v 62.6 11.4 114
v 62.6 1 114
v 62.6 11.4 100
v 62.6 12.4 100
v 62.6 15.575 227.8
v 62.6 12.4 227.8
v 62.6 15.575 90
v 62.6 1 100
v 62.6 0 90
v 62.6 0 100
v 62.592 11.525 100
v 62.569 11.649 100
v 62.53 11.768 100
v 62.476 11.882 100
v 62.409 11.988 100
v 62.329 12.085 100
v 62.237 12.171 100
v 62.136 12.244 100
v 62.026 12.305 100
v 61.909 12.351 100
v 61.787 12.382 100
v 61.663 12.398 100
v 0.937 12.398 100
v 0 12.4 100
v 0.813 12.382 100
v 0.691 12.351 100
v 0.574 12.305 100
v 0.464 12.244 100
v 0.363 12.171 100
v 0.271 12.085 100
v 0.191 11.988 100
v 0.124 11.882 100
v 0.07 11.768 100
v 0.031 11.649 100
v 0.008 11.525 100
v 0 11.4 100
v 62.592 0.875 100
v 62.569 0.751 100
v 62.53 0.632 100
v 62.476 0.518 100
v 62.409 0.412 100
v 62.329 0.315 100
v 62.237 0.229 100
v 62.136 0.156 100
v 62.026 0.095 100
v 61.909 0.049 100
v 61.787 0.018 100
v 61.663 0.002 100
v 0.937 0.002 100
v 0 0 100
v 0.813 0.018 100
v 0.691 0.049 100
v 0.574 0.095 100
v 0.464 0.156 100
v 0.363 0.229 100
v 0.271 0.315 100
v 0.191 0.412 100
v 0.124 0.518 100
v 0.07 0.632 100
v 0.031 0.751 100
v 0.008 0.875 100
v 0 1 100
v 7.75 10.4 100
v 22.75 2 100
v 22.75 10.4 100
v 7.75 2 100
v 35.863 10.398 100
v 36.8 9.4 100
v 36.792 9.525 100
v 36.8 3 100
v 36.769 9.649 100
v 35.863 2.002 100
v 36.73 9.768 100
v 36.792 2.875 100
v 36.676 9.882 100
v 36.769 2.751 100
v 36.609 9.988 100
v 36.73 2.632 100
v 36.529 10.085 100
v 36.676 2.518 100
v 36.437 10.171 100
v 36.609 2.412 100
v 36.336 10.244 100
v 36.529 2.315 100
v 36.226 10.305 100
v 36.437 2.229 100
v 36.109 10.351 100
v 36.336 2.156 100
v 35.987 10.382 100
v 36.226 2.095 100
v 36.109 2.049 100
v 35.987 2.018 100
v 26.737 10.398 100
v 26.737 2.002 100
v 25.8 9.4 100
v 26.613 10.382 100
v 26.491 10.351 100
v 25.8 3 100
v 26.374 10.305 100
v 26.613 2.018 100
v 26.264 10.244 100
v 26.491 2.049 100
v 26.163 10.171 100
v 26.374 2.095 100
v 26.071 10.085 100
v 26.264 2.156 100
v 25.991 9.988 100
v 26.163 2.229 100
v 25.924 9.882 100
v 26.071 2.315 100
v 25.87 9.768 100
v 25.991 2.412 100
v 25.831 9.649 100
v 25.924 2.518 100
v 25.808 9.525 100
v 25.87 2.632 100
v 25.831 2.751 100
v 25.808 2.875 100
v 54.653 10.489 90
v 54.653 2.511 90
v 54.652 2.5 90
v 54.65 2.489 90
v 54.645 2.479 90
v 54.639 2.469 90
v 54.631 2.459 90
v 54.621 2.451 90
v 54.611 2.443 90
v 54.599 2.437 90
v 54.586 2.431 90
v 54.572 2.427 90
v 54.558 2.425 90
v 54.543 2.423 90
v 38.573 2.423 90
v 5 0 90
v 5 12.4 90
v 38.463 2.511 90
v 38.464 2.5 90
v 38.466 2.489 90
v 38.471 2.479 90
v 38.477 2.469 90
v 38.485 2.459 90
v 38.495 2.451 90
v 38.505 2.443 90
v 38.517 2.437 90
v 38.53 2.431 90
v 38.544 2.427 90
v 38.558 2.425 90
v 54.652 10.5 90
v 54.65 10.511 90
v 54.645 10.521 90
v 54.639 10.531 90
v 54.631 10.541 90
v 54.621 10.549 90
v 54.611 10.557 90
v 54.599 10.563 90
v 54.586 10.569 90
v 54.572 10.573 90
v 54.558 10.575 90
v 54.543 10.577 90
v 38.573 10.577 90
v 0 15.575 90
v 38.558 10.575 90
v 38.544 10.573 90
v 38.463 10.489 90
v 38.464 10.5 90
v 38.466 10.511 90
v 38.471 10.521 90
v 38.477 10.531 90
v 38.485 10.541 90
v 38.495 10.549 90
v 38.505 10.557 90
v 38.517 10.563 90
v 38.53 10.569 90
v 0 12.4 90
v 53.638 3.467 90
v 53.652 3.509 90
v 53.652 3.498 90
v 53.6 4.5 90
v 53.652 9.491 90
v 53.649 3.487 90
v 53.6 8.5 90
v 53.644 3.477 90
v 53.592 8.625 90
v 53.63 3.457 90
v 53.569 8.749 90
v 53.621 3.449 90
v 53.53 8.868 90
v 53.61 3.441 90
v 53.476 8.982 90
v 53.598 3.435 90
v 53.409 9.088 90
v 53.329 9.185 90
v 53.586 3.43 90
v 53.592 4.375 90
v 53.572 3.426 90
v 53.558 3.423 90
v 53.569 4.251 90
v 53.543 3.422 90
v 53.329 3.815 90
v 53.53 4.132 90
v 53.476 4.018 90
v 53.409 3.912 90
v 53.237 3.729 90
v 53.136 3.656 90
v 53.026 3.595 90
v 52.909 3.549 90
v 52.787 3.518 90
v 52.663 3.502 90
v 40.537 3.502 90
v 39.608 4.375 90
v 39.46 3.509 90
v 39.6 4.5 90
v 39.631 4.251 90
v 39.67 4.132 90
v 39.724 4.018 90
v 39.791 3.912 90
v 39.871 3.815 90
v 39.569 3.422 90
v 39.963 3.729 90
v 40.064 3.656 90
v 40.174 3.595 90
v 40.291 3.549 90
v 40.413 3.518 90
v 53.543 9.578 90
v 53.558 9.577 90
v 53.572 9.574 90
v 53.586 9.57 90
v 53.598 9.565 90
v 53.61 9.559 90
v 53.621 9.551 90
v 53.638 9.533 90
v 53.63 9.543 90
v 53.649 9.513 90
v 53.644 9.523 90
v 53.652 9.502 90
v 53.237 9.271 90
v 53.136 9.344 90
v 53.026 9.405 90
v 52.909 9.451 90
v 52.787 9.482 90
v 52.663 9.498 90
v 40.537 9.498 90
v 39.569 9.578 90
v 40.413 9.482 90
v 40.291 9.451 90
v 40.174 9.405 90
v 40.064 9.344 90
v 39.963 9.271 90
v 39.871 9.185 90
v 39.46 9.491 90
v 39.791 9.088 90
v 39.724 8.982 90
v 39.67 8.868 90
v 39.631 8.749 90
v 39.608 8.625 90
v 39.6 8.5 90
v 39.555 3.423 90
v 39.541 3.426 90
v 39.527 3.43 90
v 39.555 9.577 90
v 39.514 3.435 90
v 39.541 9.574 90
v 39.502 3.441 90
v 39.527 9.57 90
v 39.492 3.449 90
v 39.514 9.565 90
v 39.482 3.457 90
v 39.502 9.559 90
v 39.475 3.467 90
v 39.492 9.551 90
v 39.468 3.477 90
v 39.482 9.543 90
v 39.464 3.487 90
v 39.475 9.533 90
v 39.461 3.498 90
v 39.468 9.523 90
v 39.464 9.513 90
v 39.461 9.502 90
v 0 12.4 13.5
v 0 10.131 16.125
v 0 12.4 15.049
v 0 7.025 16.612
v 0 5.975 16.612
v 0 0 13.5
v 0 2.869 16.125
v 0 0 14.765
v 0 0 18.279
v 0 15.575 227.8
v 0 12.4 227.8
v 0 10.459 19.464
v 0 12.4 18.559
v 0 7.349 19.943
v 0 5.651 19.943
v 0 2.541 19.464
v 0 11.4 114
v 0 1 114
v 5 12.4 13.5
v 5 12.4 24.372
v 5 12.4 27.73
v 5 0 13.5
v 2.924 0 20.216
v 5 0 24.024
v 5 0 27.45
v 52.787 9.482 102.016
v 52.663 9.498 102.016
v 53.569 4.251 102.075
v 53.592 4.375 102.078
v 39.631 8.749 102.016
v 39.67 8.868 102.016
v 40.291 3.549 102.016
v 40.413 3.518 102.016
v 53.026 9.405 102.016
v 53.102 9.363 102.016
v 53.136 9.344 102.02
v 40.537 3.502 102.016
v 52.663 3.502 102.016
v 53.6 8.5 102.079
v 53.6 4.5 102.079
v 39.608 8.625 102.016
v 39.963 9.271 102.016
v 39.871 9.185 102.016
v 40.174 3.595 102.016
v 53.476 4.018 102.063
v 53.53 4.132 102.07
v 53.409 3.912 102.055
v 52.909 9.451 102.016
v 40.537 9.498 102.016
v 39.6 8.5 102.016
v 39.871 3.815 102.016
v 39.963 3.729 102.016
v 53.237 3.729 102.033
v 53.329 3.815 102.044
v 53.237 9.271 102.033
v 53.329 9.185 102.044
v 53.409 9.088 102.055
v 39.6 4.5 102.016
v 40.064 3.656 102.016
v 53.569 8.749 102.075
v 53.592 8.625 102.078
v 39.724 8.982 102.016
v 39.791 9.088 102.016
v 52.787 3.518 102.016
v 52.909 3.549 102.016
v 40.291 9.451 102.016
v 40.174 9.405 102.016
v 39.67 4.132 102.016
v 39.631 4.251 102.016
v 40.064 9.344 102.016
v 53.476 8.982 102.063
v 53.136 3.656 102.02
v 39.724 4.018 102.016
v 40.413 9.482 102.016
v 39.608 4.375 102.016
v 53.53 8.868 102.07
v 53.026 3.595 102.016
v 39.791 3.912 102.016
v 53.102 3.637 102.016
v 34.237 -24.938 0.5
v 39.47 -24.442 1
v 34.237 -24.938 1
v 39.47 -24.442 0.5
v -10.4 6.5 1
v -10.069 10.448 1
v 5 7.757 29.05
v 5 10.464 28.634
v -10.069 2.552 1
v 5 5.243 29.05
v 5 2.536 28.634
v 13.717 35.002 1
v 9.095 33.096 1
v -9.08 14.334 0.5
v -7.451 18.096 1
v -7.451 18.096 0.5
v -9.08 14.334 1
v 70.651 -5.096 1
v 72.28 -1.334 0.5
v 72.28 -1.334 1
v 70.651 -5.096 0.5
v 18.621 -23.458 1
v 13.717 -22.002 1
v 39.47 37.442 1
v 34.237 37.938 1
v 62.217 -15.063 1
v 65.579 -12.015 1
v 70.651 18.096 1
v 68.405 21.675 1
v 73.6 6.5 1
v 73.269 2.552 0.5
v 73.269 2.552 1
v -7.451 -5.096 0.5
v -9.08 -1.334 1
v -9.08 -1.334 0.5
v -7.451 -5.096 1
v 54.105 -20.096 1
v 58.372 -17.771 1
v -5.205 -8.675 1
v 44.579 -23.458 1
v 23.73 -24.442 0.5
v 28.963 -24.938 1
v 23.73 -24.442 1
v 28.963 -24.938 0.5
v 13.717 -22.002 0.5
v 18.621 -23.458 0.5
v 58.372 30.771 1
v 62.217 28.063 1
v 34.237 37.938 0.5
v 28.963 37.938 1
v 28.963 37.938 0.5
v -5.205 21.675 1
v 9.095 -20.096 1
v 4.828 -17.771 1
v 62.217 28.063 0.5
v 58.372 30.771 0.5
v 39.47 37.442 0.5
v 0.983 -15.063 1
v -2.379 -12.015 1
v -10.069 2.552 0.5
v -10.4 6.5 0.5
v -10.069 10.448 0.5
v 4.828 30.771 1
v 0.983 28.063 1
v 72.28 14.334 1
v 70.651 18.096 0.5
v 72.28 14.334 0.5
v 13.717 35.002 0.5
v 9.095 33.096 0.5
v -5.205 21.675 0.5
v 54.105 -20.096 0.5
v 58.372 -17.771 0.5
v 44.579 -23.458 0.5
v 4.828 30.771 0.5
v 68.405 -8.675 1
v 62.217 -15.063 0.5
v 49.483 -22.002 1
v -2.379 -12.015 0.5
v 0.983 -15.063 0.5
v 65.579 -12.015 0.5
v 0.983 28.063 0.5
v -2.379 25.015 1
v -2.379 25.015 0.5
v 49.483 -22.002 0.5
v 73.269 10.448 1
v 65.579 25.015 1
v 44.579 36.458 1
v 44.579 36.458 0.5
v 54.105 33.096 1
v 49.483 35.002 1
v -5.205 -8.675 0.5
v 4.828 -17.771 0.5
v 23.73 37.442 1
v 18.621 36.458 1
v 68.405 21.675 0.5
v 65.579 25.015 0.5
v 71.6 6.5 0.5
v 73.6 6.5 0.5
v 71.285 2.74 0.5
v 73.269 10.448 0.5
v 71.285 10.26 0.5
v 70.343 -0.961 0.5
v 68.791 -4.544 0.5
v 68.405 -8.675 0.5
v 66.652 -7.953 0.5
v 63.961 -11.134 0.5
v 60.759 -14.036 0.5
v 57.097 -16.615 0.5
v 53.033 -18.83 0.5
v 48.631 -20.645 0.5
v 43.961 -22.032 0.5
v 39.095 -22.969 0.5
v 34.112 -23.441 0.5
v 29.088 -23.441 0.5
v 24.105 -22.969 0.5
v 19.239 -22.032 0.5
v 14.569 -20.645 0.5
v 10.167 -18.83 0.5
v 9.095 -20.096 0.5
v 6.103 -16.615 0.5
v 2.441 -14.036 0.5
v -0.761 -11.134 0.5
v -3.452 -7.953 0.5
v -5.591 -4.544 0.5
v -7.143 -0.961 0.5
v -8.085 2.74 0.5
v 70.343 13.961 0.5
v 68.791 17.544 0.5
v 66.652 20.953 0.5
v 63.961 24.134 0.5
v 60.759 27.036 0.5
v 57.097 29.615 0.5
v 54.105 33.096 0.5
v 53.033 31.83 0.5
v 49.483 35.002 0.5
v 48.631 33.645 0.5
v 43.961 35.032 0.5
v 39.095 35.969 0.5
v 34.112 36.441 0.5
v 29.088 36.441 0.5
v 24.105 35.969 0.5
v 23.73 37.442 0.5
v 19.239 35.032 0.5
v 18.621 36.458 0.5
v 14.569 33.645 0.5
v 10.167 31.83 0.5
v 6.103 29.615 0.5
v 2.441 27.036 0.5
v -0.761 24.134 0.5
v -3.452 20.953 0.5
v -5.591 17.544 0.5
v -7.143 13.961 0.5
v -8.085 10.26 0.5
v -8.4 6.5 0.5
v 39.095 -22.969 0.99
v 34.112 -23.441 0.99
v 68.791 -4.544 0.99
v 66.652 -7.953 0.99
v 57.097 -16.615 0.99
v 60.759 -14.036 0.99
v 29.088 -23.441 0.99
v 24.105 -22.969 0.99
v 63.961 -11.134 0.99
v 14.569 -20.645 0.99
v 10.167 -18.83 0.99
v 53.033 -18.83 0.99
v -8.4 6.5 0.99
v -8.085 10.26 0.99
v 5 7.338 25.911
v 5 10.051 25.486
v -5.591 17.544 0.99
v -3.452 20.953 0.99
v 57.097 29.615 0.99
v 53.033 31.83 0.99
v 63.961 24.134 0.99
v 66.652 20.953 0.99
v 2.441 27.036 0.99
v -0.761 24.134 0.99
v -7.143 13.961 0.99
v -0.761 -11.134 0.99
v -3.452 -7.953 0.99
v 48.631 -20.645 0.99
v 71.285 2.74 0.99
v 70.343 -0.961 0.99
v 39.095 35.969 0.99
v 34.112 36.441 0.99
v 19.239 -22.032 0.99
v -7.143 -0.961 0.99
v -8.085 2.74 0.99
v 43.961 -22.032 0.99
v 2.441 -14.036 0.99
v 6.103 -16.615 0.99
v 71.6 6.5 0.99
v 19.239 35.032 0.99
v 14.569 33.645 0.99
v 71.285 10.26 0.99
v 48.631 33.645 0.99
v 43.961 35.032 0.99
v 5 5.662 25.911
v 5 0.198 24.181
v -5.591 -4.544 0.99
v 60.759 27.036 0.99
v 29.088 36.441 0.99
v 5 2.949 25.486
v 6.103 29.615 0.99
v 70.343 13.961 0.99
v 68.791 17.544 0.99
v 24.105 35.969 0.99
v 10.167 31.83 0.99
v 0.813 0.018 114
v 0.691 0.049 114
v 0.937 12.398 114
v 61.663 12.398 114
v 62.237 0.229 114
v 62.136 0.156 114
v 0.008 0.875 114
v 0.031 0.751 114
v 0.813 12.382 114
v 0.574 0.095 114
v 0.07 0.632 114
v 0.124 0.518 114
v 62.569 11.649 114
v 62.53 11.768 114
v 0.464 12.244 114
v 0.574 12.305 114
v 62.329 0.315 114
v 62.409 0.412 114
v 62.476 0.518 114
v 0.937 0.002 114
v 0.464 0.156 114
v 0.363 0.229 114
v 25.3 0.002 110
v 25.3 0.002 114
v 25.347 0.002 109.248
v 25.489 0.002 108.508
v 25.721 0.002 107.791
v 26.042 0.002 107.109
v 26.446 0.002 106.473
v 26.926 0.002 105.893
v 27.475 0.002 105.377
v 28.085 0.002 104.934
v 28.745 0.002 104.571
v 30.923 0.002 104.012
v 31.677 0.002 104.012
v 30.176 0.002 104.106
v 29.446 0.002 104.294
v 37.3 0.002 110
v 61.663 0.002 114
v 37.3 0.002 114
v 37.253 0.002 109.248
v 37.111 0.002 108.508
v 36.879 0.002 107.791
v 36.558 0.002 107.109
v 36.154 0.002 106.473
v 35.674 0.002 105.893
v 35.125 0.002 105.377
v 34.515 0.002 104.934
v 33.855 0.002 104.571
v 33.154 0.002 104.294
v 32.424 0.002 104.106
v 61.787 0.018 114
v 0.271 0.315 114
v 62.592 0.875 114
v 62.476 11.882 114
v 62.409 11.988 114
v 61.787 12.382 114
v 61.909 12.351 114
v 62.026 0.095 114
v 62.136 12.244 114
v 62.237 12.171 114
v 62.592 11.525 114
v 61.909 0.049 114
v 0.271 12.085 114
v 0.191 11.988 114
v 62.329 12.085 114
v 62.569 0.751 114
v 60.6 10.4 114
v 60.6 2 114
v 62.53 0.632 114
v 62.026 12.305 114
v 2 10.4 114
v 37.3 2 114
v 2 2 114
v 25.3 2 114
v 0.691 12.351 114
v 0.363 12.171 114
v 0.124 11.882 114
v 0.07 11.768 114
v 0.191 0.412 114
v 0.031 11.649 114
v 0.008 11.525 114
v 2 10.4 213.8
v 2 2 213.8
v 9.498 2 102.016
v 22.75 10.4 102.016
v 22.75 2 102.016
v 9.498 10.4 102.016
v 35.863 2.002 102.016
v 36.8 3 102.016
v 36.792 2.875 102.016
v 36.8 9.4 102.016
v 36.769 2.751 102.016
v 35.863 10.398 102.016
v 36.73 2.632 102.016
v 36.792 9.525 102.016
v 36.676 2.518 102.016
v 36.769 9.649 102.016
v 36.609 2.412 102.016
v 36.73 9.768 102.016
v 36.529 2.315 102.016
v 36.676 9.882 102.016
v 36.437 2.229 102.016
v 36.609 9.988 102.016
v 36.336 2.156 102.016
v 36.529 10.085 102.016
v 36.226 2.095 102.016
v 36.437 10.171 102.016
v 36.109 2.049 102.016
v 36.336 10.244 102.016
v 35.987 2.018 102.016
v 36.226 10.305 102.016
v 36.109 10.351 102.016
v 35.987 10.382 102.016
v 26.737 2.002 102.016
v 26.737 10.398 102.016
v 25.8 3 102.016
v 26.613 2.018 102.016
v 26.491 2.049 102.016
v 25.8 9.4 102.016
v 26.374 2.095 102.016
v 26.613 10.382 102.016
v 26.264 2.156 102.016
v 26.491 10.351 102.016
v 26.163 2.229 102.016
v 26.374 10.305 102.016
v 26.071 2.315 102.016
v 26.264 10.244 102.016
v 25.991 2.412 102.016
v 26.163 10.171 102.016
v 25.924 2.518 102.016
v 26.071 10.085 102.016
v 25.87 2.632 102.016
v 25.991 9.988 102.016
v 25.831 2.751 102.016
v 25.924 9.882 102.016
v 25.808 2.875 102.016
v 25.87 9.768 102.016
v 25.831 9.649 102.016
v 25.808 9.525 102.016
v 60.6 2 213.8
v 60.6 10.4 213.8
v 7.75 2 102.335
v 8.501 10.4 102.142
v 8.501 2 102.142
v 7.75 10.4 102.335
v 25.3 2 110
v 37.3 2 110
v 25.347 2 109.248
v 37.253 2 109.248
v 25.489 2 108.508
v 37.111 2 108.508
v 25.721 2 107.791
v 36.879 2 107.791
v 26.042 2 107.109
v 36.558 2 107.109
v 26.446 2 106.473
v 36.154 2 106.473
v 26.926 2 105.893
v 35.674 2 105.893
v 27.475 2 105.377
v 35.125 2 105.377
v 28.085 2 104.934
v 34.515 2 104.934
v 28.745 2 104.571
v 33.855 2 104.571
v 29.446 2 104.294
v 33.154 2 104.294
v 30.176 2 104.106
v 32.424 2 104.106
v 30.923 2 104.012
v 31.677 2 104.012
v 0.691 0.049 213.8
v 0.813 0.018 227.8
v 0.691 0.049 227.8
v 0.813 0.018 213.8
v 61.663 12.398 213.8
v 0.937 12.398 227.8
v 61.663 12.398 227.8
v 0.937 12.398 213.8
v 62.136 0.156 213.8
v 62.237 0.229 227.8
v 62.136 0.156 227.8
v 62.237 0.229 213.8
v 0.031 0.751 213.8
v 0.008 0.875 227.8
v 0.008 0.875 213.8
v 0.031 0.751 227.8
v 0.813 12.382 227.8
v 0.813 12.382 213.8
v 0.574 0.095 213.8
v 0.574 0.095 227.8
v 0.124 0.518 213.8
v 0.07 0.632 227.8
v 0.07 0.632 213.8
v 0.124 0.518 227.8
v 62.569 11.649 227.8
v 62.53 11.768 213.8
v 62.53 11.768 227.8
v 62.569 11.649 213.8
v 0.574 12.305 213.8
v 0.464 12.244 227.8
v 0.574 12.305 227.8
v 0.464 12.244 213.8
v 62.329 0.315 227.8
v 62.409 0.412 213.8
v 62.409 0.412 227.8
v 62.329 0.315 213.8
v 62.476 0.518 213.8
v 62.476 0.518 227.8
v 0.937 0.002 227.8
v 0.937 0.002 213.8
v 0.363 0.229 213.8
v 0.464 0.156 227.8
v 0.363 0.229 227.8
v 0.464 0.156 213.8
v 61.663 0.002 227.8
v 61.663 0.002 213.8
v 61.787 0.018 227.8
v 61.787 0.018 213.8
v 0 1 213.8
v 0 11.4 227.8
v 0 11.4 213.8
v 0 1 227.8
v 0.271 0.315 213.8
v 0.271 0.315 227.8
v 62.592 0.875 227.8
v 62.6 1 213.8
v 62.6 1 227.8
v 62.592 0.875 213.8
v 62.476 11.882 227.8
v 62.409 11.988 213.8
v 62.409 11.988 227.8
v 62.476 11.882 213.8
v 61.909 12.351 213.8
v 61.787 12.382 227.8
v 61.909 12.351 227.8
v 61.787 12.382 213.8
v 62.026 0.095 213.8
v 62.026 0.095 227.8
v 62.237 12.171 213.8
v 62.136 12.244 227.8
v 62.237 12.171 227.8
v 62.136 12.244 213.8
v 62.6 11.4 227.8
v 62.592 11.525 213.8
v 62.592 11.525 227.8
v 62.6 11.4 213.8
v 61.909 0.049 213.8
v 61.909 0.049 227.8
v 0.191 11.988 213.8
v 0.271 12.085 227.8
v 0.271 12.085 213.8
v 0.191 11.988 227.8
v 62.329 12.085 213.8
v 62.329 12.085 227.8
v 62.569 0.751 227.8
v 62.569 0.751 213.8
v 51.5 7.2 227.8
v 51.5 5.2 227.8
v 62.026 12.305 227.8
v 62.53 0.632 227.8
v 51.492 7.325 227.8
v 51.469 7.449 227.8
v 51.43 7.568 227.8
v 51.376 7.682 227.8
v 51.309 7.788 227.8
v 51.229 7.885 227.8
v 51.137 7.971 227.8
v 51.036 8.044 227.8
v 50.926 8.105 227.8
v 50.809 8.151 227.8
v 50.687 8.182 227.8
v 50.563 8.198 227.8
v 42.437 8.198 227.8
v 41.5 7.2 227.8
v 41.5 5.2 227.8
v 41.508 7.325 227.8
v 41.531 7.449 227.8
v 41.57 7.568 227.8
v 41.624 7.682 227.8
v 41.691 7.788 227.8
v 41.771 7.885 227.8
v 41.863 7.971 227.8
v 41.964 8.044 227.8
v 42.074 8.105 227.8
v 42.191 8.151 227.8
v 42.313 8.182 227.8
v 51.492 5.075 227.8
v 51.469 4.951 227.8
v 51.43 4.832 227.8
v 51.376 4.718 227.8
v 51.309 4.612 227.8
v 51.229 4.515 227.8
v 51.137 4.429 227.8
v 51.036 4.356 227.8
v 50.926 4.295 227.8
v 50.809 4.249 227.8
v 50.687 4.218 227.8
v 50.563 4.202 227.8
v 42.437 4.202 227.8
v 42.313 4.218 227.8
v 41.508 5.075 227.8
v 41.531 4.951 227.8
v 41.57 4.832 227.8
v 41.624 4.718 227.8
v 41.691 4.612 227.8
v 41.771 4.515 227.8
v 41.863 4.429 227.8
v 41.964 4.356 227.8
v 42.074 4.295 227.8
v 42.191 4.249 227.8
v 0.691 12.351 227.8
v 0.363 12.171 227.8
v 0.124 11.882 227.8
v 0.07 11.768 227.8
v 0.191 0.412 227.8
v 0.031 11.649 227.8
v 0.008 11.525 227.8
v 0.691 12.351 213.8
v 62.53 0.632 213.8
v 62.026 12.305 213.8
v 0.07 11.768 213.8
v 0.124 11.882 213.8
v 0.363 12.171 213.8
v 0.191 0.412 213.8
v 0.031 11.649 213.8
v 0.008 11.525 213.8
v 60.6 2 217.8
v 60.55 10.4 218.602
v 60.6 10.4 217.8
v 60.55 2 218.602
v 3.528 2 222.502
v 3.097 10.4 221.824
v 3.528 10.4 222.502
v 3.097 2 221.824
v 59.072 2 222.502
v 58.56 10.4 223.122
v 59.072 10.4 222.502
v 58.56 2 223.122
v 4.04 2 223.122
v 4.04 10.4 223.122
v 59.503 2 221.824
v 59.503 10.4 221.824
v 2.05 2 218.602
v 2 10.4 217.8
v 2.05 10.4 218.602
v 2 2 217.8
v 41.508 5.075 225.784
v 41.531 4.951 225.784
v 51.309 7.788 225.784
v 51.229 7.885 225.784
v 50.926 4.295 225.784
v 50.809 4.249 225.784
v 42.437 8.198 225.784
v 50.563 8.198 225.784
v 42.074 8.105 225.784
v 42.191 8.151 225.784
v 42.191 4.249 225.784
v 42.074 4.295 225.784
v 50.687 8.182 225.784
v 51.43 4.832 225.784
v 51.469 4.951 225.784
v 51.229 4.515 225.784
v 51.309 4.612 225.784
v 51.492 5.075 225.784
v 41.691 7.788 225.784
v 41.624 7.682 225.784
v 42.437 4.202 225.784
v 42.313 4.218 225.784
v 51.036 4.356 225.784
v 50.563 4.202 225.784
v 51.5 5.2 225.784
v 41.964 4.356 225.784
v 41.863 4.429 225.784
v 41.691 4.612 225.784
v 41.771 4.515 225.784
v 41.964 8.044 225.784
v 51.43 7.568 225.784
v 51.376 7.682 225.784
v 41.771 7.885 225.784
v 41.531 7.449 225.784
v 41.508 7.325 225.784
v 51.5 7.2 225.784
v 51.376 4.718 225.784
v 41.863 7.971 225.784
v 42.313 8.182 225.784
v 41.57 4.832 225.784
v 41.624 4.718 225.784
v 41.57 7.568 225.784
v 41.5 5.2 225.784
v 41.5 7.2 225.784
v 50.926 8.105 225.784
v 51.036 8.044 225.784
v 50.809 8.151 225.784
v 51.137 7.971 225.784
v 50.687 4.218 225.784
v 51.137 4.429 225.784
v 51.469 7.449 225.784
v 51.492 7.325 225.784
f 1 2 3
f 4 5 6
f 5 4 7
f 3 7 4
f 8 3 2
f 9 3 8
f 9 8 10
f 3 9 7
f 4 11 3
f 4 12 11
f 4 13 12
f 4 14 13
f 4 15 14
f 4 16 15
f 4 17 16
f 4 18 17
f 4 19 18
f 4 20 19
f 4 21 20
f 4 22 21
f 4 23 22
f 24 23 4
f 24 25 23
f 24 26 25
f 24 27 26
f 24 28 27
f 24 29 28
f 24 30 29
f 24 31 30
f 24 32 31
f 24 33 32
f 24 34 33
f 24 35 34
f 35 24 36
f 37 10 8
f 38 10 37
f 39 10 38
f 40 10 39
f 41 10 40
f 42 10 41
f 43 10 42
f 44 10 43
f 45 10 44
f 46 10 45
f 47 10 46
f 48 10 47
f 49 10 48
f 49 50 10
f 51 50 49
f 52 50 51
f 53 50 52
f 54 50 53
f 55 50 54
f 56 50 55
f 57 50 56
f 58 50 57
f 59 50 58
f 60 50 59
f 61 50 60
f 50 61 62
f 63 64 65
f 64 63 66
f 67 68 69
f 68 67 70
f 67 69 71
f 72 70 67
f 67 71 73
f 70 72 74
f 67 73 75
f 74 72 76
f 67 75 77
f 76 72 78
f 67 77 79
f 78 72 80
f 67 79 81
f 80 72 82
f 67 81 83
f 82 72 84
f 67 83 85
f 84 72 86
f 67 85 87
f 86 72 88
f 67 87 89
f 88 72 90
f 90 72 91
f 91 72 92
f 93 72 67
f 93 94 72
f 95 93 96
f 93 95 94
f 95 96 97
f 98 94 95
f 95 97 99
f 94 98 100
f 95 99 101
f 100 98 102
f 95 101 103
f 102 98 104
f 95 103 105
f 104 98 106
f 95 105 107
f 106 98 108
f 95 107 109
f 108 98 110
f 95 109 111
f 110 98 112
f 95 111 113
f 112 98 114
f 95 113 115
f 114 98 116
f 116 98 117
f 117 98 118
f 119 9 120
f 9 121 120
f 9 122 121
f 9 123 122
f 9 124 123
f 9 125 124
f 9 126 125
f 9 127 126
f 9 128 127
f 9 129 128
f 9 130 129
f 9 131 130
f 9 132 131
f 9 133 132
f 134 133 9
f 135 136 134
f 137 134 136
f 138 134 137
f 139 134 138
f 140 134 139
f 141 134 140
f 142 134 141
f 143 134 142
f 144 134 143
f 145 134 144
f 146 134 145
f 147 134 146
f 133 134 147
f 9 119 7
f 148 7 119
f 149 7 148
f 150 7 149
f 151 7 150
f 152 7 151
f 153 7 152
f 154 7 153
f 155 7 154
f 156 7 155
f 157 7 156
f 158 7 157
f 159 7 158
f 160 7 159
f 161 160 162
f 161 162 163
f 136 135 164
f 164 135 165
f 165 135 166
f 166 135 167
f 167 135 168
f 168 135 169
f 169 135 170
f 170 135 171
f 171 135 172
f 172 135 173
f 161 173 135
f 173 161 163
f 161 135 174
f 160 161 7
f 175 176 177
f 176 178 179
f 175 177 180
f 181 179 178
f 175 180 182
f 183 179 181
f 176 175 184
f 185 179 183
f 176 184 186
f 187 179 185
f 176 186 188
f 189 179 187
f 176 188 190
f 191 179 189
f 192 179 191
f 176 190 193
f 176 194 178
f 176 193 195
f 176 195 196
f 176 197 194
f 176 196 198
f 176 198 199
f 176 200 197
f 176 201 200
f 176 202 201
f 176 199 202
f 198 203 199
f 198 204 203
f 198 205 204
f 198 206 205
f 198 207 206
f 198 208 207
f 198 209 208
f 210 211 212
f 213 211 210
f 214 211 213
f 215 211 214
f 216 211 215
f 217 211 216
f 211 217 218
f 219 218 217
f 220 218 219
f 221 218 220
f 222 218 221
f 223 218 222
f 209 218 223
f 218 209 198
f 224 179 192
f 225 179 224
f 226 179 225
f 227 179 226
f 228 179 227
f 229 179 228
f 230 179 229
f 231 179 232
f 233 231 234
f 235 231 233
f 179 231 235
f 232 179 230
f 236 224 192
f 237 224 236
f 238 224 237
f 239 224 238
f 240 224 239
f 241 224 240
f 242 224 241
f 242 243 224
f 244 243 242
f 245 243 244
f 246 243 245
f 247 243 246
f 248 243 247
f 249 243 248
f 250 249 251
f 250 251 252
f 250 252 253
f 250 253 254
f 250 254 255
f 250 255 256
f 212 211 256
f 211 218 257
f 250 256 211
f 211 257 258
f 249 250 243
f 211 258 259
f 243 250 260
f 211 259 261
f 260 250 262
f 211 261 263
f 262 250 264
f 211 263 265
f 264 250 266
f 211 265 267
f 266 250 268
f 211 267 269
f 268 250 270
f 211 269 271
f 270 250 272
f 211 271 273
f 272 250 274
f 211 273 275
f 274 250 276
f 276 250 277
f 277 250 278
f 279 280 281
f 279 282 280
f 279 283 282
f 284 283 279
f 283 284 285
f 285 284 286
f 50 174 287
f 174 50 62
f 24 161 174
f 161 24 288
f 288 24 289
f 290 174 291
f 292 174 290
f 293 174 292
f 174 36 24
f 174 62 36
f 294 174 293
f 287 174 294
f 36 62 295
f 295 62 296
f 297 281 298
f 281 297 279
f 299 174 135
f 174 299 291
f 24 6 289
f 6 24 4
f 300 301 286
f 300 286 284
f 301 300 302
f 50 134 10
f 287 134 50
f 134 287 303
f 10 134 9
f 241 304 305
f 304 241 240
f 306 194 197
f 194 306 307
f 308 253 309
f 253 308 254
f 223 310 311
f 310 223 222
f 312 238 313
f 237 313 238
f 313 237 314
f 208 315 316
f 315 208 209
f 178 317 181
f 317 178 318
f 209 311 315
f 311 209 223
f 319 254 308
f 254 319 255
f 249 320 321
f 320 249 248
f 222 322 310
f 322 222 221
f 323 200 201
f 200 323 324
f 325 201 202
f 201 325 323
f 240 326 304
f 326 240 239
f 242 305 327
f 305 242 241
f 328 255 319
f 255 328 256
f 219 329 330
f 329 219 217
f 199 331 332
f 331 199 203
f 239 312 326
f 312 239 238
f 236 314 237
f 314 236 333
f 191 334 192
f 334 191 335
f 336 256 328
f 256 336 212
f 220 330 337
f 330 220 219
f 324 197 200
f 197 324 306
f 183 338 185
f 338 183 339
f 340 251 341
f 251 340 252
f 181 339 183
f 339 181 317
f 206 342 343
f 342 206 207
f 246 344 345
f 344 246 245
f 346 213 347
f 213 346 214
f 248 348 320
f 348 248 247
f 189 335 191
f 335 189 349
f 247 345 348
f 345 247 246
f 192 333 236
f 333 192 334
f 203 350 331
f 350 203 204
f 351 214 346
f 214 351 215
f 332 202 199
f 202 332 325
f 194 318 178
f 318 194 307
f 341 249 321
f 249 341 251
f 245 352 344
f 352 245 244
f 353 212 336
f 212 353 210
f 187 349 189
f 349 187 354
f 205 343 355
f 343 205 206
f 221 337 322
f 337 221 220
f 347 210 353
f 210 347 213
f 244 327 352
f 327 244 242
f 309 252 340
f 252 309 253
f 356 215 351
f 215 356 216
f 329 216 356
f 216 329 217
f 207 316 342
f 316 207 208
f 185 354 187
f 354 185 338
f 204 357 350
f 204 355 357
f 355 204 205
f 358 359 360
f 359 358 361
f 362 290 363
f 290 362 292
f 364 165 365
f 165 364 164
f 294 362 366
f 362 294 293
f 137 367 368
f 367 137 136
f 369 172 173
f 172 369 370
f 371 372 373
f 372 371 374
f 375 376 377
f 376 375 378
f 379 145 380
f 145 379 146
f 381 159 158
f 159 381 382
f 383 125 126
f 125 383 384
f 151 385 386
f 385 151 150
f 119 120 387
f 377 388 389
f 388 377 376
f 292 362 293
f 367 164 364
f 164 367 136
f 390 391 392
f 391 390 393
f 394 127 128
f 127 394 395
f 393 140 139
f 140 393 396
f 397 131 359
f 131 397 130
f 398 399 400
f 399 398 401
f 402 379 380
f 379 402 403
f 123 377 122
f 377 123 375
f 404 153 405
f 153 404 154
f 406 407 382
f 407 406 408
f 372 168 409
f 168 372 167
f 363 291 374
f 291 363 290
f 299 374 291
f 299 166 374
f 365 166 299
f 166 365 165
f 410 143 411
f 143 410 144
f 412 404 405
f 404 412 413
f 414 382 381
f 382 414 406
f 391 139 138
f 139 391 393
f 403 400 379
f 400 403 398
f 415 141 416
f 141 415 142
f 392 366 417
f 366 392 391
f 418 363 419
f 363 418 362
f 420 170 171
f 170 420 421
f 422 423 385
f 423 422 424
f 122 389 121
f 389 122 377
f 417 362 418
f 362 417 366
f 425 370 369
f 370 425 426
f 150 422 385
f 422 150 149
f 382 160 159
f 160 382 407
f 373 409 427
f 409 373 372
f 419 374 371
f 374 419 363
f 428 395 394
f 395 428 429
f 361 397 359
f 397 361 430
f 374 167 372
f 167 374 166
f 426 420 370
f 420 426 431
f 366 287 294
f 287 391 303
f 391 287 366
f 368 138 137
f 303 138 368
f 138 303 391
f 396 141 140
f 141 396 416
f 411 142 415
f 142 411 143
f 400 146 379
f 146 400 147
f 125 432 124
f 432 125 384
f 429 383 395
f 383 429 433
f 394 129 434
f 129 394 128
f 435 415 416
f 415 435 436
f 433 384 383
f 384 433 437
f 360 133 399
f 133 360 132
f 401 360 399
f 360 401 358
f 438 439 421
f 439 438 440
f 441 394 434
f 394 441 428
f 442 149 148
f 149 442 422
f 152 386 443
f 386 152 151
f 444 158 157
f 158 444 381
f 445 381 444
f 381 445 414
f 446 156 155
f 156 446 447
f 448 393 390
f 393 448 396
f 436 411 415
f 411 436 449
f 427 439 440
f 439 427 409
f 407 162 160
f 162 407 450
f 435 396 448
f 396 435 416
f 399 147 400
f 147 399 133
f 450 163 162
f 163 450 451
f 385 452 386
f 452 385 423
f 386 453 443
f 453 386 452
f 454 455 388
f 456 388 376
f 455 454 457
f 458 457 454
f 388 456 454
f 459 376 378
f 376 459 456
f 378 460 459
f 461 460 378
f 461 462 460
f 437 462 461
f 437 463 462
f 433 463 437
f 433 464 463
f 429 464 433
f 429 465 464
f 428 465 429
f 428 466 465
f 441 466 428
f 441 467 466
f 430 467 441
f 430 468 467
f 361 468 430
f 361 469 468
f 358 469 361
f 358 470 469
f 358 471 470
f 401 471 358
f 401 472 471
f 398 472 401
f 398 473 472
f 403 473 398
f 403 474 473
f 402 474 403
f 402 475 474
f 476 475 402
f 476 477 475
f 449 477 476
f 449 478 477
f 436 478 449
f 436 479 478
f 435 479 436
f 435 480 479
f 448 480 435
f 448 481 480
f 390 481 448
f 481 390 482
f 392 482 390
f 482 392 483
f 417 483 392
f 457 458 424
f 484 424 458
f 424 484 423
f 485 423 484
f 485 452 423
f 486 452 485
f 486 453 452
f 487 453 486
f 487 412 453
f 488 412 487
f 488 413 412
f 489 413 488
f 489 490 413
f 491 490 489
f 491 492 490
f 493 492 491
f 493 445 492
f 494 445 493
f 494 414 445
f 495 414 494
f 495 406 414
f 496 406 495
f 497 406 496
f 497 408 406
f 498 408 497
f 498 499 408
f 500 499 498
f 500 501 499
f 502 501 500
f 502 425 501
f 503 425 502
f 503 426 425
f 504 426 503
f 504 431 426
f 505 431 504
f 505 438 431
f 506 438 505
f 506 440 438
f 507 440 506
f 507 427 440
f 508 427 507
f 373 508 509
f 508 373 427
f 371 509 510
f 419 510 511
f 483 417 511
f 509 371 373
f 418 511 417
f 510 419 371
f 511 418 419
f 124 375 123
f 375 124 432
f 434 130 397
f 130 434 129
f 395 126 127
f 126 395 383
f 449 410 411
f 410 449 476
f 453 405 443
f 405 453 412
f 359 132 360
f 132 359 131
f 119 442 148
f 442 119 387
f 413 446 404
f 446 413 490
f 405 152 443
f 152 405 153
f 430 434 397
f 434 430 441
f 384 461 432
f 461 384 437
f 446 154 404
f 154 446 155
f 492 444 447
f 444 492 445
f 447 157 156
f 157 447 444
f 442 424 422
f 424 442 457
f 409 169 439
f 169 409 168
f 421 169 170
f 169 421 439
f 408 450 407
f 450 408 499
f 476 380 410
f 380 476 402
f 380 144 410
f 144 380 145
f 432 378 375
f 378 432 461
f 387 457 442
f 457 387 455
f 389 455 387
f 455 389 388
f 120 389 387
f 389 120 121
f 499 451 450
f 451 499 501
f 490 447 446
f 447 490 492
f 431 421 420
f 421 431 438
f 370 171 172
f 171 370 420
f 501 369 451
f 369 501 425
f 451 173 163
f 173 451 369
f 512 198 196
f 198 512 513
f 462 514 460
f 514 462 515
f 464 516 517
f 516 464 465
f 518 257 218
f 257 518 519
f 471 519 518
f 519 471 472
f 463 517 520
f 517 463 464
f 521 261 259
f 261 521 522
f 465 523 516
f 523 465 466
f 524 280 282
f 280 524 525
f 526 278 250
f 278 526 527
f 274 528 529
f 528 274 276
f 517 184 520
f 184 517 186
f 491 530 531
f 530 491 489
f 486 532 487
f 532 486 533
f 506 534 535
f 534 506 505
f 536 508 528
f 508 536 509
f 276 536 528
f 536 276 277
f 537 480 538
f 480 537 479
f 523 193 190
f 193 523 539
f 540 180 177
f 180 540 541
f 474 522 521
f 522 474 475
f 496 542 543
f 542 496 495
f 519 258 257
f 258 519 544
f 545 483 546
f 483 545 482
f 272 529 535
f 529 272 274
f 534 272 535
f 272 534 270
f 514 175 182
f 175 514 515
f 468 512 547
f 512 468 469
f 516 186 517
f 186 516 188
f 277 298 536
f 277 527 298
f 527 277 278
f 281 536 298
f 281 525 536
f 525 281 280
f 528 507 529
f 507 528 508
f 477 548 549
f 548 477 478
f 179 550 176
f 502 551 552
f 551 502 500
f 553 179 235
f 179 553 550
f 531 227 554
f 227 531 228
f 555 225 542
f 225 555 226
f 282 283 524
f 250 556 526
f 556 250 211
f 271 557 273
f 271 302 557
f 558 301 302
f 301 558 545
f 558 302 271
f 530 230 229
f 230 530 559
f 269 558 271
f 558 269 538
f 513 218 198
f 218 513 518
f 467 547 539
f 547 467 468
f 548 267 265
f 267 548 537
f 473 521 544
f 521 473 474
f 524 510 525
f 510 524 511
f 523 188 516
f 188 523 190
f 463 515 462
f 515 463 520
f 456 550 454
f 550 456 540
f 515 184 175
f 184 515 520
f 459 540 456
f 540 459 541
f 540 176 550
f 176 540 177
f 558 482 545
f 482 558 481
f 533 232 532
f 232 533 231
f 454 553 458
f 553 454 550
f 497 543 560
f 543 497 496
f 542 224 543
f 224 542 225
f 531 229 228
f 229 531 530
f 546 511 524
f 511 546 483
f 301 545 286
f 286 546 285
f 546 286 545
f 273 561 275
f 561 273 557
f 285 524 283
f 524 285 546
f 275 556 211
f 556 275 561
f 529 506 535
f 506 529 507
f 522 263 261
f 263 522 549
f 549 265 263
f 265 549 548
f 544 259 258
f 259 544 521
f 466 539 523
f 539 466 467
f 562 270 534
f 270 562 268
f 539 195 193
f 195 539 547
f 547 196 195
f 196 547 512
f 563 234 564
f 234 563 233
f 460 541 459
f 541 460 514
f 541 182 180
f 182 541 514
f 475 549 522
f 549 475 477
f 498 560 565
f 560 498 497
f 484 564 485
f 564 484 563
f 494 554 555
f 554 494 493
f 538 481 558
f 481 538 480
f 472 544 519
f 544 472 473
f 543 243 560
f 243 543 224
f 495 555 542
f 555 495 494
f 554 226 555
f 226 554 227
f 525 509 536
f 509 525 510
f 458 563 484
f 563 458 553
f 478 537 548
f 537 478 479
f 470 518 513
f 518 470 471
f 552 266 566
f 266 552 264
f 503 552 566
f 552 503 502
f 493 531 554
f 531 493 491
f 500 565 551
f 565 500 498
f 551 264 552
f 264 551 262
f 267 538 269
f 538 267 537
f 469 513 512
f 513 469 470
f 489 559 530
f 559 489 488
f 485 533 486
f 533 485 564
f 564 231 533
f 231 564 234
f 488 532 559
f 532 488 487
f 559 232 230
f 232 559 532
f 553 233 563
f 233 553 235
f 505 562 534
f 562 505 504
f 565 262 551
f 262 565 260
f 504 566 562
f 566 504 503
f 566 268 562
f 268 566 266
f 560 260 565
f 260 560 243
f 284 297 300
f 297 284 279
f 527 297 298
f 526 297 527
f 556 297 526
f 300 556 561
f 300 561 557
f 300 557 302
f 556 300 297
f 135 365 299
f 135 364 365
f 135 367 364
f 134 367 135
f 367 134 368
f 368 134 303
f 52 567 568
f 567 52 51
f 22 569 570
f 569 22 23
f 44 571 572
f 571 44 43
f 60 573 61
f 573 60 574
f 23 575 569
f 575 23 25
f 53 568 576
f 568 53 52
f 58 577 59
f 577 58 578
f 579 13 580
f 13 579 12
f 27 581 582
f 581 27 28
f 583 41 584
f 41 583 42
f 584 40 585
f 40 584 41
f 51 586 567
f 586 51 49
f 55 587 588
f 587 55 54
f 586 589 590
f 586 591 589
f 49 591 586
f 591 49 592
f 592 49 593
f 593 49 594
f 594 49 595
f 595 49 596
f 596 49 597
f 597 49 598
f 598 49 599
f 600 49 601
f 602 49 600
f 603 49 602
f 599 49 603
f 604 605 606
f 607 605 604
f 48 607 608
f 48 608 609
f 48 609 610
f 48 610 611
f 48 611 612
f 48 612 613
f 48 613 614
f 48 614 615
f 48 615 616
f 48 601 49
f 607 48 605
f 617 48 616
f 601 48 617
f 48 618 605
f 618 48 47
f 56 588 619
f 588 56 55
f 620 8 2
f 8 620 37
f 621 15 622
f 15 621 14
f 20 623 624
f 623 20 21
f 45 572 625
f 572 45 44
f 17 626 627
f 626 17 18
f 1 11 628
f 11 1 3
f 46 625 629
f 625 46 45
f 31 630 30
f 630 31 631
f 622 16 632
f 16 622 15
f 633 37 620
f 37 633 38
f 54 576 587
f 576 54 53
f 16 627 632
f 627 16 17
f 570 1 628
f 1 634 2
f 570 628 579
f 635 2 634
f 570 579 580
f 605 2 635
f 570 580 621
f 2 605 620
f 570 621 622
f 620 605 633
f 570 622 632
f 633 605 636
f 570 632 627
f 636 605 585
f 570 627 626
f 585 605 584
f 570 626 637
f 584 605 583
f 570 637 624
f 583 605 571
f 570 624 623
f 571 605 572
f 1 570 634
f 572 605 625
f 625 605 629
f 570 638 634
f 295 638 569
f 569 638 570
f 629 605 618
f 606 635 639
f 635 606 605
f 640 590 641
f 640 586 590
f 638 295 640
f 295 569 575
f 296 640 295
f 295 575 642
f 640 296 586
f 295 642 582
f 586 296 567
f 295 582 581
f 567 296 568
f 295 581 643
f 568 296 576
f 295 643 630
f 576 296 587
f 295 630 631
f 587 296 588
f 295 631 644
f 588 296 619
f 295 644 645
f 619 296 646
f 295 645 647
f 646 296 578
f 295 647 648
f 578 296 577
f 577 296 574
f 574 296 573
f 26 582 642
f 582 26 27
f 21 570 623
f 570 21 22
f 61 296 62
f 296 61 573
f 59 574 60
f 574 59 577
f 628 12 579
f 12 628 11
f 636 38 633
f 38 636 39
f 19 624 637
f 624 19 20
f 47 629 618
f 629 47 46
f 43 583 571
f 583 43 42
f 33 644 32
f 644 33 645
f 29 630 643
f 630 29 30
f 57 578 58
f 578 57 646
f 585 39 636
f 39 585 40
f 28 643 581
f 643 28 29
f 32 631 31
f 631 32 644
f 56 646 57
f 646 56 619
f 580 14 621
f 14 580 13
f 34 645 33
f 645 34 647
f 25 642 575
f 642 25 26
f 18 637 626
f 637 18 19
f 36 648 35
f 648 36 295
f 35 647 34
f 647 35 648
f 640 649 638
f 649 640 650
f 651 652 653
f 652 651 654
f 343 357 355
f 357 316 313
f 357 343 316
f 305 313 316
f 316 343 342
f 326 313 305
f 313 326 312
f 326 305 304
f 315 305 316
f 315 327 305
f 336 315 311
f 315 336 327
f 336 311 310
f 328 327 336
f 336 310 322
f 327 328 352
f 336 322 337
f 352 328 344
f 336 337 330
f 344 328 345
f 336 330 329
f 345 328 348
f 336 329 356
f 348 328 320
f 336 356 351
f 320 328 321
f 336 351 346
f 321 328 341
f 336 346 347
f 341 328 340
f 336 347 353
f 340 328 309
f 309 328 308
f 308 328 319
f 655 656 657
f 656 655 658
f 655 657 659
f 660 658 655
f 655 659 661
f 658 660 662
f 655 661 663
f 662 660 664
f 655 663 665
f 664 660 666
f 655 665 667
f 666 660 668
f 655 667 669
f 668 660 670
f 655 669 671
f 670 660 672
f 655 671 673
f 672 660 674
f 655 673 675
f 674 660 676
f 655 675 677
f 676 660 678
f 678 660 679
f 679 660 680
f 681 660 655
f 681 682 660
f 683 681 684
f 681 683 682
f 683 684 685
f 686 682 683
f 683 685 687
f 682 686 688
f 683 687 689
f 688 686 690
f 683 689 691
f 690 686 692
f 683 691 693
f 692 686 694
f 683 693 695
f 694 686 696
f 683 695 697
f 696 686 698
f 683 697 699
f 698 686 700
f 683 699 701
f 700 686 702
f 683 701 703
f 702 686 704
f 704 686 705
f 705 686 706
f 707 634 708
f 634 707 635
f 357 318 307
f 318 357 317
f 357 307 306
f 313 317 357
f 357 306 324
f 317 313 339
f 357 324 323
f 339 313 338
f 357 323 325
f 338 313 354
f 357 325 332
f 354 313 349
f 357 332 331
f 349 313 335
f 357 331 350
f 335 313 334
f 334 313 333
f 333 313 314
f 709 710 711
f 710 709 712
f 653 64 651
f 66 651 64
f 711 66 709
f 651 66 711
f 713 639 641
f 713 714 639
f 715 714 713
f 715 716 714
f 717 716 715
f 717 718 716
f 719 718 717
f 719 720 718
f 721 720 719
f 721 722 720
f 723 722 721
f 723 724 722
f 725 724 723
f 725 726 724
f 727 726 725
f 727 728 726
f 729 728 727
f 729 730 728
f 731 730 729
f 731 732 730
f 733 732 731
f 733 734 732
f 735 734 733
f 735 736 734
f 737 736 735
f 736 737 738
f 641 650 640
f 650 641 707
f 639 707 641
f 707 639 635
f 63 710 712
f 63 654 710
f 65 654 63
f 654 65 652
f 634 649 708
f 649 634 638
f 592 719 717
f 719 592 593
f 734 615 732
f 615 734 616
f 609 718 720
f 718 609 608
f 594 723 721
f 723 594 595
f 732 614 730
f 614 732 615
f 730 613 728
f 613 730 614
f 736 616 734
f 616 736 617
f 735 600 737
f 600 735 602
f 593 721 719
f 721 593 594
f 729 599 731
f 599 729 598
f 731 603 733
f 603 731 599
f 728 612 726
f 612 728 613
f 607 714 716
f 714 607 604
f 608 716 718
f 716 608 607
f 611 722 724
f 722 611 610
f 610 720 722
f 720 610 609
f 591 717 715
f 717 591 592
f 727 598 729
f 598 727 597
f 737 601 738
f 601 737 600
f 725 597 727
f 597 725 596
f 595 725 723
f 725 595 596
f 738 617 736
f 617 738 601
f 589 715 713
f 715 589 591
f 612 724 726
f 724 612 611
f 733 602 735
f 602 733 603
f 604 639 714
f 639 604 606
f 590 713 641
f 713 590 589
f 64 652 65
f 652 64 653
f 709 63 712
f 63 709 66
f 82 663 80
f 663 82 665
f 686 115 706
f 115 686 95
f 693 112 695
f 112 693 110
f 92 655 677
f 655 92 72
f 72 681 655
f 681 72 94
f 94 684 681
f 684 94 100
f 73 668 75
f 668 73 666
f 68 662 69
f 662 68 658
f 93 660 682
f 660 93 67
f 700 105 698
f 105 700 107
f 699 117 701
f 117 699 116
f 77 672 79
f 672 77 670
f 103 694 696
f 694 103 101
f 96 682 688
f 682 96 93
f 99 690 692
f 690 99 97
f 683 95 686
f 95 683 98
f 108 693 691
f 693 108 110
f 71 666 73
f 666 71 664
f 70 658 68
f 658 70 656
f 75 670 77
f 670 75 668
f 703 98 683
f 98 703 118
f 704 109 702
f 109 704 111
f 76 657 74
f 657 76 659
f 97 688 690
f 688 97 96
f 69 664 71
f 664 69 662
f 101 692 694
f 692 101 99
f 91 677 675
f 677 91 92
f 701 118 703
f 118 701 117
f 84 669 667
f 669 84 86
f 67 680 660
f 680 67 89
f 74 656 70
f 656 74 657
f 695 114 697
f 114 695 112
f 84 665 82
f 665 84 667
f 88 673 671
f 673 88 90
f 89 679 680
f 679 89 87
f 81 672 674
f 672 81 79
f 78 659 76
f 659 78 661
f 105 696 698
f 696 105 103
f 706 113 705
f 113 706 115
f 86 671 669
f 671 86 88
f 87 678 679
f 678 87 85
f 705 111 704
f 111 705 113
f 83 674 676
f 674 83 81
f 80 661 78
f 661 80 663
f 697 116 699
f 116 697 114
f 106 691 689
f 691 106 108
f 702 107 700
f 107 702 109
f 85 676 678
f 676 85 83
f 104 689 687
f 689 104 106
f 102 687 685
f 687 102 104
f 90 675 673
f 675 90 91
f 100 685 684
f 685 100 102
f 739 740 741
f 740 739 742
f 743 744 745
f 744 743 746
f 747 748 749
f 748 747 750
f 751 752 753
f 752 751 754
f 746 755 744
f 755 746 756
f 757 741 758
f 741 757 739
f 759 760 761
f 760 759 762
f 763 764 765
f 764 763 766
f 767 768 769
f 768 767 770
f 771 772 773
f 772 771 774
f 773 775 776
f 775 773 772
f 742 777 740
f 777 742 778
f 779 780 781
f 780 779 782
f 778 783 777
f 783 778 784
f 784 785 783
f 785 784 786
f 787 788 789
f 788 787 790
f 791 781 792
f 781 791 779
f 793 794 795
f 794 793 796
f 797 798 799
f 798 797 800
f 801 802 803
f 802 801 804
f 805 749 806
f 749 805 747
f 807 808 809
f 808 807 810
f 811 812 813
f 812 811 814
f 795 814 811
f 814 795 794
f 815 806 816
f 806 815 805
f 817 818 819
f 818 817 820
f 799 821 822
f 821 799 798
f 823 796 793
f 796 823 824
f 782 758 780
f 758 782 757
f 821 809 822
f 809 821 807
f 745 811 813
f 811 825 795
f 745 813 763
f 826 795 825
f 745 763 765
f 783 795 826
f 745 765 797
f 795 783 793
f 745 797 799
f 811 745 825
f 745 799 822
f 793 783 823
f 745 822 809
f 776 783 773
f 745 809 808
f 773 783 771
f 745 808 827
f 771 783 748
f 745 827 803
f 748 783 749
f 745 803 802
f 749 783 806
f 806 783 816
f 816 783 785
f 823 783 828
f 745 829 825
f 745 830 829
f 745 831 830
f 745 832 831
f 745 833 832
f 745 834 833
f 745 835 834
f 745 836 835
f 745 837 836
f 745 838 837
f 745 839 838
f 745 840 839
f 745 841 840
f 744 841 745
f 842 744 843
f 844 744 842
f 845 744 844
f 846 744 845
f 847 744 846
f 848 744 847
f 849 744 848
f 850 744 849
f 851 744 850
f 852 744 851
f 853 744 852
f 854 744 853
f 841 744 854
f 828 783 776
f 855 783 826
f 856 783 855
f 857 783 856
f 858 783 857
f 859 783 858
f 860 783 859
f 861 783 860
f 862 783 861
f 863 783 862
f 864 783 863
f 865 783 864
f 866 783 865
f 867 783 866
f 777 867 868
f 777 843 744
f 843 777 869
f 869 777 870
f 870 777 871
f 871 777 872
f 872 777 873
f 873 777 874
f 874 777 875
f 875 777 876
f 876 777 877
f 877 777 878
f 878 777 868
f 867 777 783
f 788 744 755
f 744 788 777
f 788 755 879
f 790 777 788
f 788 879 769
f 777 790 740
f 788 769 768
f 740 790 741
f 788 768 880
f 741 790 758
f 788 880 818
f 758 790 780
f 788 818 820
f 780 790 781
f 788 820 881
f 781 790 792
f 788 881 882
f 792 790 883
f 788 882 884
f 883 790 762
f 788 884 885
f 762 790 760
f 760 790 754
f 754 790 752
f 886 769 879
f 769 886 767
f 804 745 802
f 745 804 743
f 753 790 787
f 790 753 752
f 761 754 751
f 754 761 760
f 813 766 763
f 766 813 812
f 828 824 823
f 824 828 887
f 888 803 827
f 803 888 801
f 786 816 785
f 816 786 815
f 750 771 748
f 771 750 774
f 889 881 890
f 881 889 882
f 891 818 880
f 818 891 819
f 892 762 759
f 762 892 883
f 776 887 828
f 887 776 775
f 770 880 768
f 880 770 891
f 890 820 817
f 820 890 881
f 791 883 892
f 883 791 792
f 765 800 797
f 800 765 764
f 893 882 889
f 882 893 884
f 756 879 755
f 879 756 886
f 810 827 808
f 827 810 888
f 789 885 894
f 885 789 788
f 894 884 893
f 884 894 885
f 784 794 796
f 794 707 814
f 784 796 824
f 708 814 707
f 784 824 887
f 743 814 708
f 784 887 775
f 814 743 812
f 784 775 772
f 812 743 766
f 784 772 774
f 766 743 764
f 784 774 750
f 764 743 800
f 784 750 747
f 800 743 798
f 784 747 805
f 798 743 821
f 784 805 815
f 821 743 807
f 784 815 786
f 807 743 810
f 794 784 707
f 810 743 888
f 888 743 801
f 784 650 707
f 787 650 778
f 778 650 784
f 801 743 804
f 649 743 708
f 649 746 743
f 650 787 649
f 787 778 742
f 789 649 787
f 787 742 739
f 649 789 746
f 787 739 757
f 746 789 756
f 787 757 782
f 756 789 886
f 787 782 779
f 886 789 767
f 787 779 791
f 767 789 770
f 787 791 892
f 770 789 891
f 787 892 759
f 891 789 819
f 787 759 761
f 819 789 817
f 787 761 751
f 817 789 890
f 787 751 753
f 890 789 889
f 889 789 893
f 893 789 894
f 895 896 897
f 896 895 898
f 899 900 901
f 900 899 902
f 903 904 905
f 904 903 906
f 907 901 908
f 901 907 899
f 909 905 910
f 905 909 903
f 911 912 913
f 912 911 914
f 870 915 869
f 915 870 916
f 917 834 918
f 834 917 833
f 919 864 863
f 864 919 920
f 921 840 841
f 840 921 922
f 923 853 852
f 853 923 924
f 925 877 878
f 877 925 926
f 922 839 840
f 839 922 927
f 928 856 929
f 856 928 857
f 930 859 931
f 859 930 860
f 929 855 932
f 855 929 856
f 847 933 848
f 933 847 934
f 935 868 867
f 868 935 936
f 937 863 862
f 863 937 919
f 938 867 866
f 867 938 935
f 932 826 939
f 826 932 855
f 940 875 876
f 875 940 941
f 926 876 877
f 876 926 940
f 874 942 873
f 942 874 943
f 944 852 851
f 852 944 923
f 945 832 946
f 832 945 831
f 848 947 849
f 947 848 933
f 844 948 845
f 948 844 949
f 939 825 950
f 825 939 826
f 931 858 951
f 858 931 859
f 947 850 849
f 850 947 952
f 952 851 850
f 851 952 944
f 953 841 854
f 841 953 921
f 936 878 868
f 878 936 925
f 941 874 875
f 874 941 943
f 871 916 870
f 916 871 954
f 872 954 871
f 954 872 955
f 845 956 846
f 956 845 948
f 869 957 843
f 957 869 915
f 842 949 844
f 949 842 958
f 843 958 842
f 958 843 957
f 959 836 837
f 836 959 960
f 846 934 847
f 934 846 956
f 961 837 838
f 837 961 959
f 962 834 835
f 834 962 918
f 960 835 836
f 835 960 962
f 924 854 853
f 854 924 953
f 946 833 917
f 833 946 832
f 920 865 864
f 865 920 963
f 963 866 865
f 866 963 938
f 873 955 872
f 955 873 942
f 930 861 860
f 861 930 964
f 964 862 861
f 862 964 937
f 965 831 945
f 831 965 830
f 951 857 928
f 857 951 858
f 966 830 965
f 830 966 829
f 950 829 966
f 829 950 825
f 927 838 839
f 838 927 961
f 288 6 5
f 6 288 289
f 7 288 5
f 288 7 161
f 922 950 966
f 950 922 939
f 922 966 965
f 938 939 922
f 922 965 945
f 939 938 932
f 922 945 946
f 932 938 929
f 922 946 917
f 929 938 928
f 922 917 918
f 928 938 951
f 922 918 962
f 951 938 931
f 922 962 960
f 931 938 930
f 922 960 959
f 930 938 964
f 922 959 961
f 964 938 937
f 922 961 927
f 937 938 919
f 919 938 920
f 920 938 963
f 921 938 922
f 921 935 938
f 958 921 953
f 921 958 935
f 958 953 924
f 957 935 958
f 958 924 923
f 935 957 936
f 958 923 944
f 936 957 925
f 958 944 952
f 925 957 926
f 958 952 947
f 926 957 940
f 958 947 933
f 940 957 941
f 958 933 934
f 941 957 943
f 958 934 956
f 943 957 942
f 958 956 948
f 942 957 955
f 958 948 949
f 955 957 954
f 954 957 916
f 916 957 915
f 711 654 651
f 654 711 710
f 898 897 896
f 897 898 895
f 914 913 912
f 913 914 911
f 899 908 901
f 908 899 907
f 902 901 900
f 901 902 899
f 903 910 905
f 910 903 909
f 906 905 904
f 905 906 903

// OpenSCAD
// file: ../lib/basics.scad
// ## `basics.scad`
// This library contains basic elements to construct mobile device augmentations.

// ### `roundedCube(dimension,edgeRadius)`
// A cube with rounded edges on the depth axis. This function is helpful for creating simple phone shapes.
// #### Where
// * `dimension=[width,depth,height]`: the size of the cube
// * `edgeRadius`: the radius of the rounded edges 
module roundedCube(dimension=[10,10,10],edgeRadius=1){
    translate([0,dimension[1],0])
		rotate([90,0,0])
			hull(){
        		translate([edgeRadius,edgeRadius,0])
					cylinder(r=edgeRadius,h=dimension[1]);
        		translate([dimension[0]-edgeRadius,edgeRadius,0])
					cylinder(r=edgeRadius,h=dimension[1]);
        		translate([edgeRadius,dimension[2]-edgeRadius,0])
					cylinder(r=edgeRadius,h=dimension[1]);
        		translate([dimension[0]-edgeRadius,dimension[2]-edgeRadius,0])
					cylinder(r=edgeRadius,h=dimension[1]);
    		}
}

// ### `bottomHolder(deviceWidth,deviceDepth,deviceEdgeRadius,deviceHeightInHolder,wallThickness,holderEdgeRadius)`
// A basic generic element to hold the bottom part of a device
// #### Where
// * `deviceWidth`: the width of the device to be held
// * `deviceDepth`: the depth of the device to be held
// * `deviceEdgeRadius`: the edge radius of the device to be held
// * `deviceHeightInHolder`: the height of the part of the holder covering the device
// * `wallThickness`: the holder's wall thickness
// * `holderEdgeRadius`: the holder's edge radius
module bottomHolder(deviceWidth=10,deviceDepth=10,deviceEdgeRadius=1,
deviceHeightInHolder=10,wallThickness=1,holderEdgeRadius=1){
	difference(){
		translate([0,deviceDepth+wallThickness*2,0])
			rotate([90,0,0])
				roundedCube([deviceWidth+wallThickness*2,deviceHeightInHolder+wallThickness,
				deviceDepth+wallThickness*2],holderEdgeRadius);
		translate([wallThickness,wallThickness,wallThickness])
			roundedCube([deviceWidth,deviceDepth,
			deviceHeightInHolder+deviceEdgeRadius],deviceEdgeRadius);
	}
}

// ### `topHolder(deviceWidth,deviceDepth,deviceEdgeRadius,deviceHeightInHolder,wallThickness,lipsWidth,holderEdgeRadius)`
// A basic generic element to hold the top part of a device
// #### Where
// * `deviceWidth`: the width of the device to be held
// * `deviceDepth`: the depth of the device to be held
// * `deviceEdgeRadius`: the edge radius of the device to be held
// * `deviceHeightInHolder`: the height of the part of the holder covering the device
// * `wallThickness`: the holder's wall thickness
// * `lipsWidth`: size of the lips holding the device
// * `holderEdgeRadius`: the holder's edge radius
module topHolder(deviceWidth=10,deviceDepth=10,deviceEdgeRadius=1,deviceHeightInHolder=10,
wallThickness=1,lipsWidth=2,holderEdgeRadius=1){
	difference(){
		translate([0,deviceDepth+wallThickness*2,0])rotate([90,0,0])
			roundedCube([deviceWidth+wallThickness*2,deviceHeightInHolder+wallThickness,
			deviceDepth+wallThickness*2],holderEdgeRadius);
		translate([wallThickness,wallThickness,-wallThickness*2])
			roundedCube([deviceWidth,deviceDepth,deviceHeightInHolder],deviceEdgeRadius);
		//translate([wallThickness+lipsWidth,-0.01,-wallThickness-lipsWidth-0.85]) // TODO: 0.85 wrong here: needs to be fixed
		//	roundedCube([deviceWidth-lipsWidth*2,wallThickness+0.02,deviceHeightInHolder],
	//		deviceEdgeRadius*((deviceWidth-lipsWidth*2)/deviceWidth));
	}
}

// ### `rectangleCircularHorn(rectangleWidth,rectangleHeight,circleRadius,hornLength,wallThickness,hornDeformationFactor,hornDerivation,endsHeight)`
// A horn with a square termination on one side and a circle termination on the other.
// #### Where
// * `rectangleWidth`: the width of the rectangular termination
// * `rectangleHeight`: the height of the rectangular termination
// * `circleRadius`: the radius of the circular termination
// * `hornLength`: the length of the horn
// * `wallThickness`: the thickness of the walls
// * `hornDeformationFactor`: controls the vertical flatness of the horn with (1=perfect circle, >1=flatened circle) 
// * `hornDerivation`: displace the position of the circular end relatively to the rectangular end on the horizontal axis
// * `endsHeight`: the height of the two ends
module rectangleCircularHorn(rectangleWidth=10,rectangleHeight=10,circleRadius=10,hornLength=10,wallThickness=1,
hornDeformationFactor=1,hornDerivation=0,endsHeight=0.5){
	difference(){
		hull(){
			cube([rectangleWidth+wallThickness,rectangleHeight+wallThickness,endsHeight],center=true);
			translate([hornDerivation,0,hornLength-endsHeight*2])
				scale([1,hornDeformationFactor,1])
					cylinder(r=circleRadius+wallThickness,h=endsHeight);
		}
		hull(){
			translate([0,0,-0.01])
				cube([rectangleWidth,rectangleHeight,endsHeight],center=true);
			translate([hornDerivation,0,hornLength-endsHeight*2+0.01])
				scale([1,hornDeformationFactor,1])
					cylinder(r=circleRadius,h=endsHeight);
		}
	}
}

// ### `halfSphere(radius)`
// A half sphere useful to create tops.
// #### Where
// * `radius`: the radius of the half sphere
module halfSphere(radius=10){
	difference(){
		translate([radius,radius,0])sphere(radius);
		translate([0,0,-radius*2])cube([radius*2,radius*2,radius*2]);
	}
}

// ### `halfCylinder(dimension=[10,10,10])`
// A half cylinder with controllable height.
// #### Where
// * `dimension=[width,depth,height]`: the size of the half cylinder
module halfCylinder(dimension=[10,10,10]){
	rotate([-90,0,0])scale([1,dimension[2]/dimension[0],1])difference(){
		translate([dimension[0]/2,0,0.01])cylinder(r=dimension[0]/2,h=dimension[1]);
		cube([dimension[0],dimension[0],dimension[1]+0.02]);
	}
}
// main file
include <../lib/iPhone5.scad>

$fn=50;

iPhone5_CaseWithLargePassiveAmp();
translate([iPhone5_Module_WallThickness,iPhone5_Module_WallThickness,iPhone5_Module_WallThickness+iPhone5_LargePassiveAmp_HornLength+iPhone5_LargePassiveAmp_BaseThickness])iPhone5();
